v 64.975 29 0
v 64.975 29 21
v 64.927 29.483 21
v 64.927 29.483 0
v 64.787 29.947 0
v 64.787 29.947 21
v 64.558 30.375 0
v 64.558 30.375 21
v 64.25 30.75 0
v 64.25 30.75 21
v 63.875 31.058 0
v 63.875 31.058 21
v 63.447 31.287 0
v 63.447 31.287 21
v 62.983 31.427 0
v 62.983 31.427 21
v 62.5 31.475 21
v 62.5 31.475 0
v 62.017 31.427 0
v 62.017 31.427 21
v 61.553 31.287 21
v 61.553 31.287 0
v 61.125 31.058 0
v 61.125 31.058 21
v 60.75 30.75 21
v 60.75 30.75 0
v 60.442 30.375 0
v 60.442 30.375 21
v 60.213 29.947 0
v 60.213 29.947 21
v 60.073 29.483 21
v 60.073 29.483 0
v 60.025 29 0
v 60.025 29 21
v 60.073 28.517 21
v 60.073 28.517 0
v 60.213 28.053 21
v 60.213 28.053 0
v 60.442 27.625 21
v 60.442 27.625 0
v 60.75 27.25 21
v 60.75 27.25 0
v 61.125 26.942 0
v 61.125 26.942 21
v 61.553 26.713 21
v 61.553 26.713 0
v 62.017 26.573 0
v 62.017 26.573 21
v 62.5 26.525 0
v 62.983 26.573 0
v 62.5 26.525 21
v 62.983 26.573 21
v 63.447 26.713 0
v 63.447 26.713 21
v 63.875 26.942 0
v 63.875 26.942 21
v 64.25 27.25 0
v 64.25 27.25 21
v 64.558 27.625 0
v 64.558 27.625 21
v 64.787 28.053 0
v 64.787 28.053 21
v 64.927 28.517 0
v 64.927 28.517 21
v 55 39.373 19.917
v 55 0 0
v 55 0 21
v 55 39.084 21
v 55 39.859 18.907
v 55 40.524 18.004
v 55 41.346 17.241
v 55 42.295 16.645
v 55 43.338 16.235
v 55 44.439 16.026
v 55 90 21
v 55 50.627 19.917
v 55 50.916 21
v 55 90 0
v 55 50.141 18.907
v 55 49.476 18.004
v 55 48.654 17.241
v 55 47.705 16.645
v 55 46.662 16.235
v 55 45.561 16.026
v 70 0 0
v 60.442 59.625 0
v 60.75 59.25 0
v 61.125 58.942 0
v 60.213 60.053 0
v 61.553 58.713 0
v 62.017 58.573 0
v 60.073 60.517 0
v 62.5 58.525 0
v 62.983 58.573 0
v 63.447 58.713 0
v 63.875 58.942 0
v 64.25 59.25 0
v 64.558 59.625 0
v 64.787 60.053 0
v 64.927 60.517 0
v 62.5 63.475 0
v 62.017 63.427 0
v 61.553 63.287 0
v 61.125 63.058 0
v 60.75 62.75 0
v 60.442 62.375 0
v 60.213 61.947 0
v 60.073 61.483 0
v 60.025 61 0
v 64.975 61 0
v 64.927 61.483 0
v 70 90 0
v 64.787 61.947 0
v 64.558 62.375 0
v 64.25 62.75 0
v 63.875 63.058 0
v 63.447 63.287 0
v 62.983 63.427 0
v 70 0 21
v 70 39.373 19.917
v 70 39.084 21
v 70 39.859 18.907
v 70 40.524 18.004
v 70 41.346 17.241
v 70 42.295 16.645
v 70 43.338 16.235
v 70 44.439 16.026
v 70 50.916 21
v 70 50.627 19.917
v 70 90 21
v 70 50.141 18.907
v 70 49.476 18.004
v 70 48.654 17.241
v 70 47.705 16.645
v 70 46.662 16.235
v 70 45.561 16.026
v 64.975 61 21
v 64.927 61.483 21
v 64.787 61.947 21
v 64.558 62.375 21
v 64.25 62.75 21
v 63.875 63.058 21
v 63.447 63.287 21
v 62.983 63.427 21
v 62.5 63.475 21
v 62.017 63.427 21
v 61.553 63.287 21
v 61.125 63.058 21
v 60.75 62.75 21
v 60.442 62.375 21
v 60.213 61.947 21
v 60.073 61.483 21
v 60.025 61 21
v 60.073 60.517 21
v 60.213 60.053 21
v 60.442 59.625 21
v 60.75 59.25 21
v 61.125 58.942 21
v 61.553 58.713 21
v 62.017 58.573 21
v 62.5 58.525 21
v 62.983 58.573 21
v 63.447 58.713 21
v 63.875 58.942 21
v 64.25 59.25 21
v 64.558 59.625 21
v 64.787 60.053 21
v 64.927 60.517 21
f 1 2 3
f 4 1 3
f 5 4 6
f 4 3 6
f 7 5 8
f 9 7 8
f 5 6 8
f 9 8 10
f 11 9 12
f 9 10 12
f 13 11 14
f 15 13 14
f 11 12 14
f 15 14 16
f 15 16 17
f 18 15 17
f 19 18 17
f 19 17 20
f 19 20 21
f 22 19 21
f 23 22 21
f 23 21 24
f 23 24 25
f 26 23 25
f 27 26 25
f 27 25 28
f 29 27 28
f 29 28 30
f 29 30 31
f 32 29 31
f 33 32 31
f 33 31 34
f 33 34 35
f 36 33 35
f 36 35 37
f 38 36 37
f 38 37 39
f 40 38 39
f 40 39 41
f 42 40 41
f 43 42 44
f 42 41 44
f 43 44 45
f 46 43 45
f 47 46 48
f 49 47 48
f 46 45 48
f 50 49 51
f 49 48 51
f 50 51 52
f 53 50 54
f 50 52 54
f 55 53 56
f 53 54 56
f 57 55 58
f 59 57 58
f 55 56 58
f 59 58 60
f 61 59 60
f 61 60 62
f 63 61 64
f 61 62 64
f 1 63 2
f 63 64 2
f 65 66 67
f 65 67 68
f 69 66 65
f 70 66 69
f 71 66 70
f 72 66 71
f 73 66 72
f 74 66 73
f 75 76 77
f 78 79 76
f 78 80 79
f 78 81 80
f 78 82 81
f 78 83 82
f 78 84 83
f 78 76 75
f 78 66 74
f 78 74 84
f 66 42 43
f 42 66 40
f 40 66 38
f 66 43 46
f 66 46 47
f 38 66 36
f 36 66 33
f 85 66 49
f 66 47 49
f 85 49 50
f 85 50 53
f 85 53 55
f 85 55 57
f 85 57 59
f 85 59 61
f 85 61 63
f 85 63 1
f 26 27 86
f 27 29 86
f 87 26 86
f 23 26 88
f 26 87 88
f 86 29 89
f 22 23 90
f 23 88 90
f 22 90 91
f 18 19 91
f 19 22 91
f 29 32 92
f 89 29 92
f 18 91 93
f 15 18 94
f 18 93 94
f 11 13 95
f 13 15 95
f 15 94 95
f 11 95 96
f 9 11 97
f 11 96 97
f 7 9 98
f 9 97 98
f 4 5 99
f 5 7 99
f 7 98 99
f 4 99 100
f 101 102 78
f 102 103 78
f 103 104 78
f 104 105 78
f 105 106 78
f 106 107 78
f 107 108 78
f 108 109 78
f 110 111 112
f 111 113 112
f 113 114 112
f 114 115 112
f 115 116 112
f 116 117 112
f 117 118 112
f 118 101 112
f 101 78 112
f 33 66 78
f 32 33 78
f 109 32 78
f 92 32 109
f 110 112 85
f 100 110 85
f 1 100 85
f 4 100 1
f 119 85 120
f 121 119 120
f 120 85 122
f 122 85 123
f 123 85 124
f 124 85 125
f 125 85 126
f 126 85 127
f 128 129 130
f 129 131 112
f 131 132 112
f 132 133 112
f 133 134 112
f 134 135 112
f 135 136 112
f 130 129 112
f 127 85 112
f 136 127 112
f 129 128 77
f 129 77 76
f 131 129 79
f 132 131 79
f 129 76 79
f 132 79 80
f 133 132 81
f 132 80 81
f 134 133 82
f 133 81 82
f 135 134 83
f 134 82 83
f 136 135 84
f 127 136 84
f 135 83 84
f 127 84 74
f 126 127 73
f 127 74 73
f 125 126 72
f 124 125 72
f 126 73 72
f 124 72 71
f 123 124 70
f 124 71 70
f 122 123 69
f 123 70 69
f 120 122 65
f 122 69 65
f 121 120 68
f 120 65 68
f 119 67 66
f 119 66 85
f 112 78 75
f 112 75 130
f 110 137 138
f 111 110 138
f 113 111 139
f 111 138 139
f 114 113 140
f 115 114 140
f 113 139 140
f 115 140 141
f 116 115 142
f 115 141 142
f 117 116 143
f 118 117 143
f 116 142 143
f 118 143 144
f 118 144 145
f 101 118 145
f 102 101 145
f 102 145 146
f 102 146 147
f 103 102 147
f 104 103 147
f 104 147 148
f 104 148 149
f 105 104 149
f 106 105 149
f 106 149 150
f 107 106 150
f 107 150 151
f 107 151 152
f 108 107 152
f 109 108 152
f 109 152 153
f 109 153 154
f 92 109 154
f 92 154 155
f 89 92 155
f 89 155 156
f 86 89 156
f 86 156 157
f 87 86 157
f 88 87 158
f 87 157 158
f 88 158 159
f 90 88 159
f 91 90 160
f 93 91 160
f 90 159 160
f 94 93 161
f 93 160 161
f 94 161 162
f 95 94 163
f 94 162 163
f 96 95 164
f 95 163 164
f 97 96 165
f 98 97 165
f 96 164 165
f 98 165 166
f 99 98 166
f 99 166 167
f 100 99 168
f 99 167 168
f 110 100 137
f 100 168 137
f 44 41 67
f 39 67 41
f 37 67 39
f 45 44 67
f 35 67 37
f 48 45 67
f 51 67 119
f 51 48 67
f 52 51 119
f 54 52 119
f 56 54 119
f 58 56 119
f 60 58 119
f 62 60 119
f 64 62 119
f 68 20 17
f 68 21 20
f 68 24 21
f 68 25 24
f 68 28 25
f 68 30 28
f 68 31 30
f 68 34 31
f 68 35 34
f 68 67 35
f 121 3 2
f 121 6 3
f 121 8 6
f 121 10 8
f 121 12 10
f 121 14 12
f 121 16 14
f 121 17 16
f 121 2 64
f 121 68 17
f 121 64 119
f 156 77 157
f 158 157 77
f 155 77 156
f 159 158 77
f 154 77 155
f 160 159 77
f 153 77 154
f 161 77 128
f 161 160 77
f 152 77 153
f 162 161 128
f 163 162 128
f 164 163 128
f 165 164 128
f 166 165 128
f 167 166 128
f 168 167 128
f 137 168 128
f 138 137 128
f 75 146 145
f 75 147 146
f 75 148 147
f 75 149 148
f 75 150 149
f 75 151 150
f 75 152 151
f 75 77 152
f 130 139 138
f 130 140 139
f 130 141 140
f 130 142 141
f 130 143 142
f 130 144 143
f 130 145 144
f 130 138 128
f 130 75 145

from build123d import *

# Parameters (mm, degrees)
SKETCH_1_W          = 70
SKETCH_1_H          = 90
EXTRUDE_1_DEPTH     = 10
SKETCH_2_W          = 15
SKETCH_2_H          = 90
EXTRUDE_2_DEPTH     = 12
EXTRUDE_3_DEPTH     = 3
EXTRUDE_4_DEPTH     = 3
CUT_EXTRUDE_1_REACH = 109.745
SKETCH_7_R          = 6
SKETCH_5_R          = 2.475
CUT_EXTRUDE_2_DEPTH = 22
SKETCH_6_R          = 1.975
CUT_EXTRUDE_4_DEPTH = 10
SKETCH_9_W          = 15
SKETCH_9_H          = 90
CUT_EXTRUDE_5_DEPTH = 1
SKETCH_11_W         = 55
SKETCH_11_H         = 90
CUT_EXTRUDE_6_DEPTH = 116.935326799


with BuildPart() as part:
    # 草图1 → 凸台-拉伸1 (new body)
    with BuildSketch(Plane.XY):
        with Locations((35, 45)):
            Rectangle(SKETCH_1_W, SKETCH_1_H)
    extrude(amount=EXTRUDE_1_DEPTH)

    # 草图2 → 凸台-拉伸2 (add)
    with BuildSketch(Plane.XY.offset(10)):
        with Locations((62.5, 45)):
            Rectangle(SKETCH_2_W, SKETCH_2_H)
    extrude(amount=EXTRUDE_2_DEPTH)

    # 草图3 → 凸台-拉伸3 (add)
    with BuildSketch(Plane(origin=(0, 90, 0), x_dir=(1, 0, 0), z_dir=(0, 1, 0))):
        Polygon((55, -10), (6, -10), (55, -21), align=None)
    extrude(amount=-EXTRUDE_3_DEPTH)

    # 草图4 → 凸台-拉伸4 (add)
    with BuildSketch(Plane.XZ):
        Polygon((55, 21), (6, 10), (55, 10), align=None)
    extrude(amount=-EXTRUDE_4_DEPTH)

    # 草图7 → 切除-拉伸1 (cut, up to next)
    with BuildSketch(Plane.ZY.offset(-55), mode=Mode.PRIVATE) as cut_extrude_1_sk1:
        with Locations((22, 45)):
            Circle(SKETCH_7_R)
    cut_extrude_1_tool1 = extrude(cut_extrude_1_sk1.sketch, amount=-CUT_EXTRUDE_1_REACH, mode=Mode.PRIVATE) & part.part
    add(cut_extrude_1_tool1.solids().sort_by_distance((55, 45, 22))[0], mode=Mode.SUBTRACT)

    # 草图5 → 切除-拉伸2 (cut)
    with BuildSketch(Plane.XY.offset(22)):
        with Locations((62.5, 61)):
            Circle(SKETCH_5_R)
        with Locations((62.5, 29)):
            Circle(SKETCH_5_R)
    extrude(amount=-CUT_EXTRUDE_2_DEPTH, mode=Mode.SUBTRACT)

    # 草图6 → 切除-拉伸4 (cut)
    with BuildSketch(Plane.XY.offset(10)):
        with Locations((3, 29)):
            Circle(SKETCH_6_R)
        with Locations((3, 61)):
            Circle(SKETCH_6_R)
    extrude(amount=-CUT_EXTRUDE_4_DEPTH, mode=Mode.SUBTRACT)

    # 草图9 → 切除-拉伸5 (cut)
    with BuildSketch(Plane.XY.offset(22)):
        with Locations((62.5, 45)):
            Rectangle(SKETCH_9_W, SKETCH_9_H)
    extrude(amount=-CUT_EXTRUDE_5_DEPTH, mode=Mode.SUBTRACT)

    # 草图11 → 切除-拉伸6 (cut, through all)
    with BuildSketch(Plane(origin=(0, 0, 0), x_dir=(-1, 0, 0), z_dir=(0, 0, -1))):
        with Locations((-27.5, 45)):
            Rectangle(SKETCH_11_W, SKETCH_11_H)
    extrude(amount=-CUT_EXTRUDE_6_DEPTH, mode=Mode.SUBTRACT)


solid = part.part
